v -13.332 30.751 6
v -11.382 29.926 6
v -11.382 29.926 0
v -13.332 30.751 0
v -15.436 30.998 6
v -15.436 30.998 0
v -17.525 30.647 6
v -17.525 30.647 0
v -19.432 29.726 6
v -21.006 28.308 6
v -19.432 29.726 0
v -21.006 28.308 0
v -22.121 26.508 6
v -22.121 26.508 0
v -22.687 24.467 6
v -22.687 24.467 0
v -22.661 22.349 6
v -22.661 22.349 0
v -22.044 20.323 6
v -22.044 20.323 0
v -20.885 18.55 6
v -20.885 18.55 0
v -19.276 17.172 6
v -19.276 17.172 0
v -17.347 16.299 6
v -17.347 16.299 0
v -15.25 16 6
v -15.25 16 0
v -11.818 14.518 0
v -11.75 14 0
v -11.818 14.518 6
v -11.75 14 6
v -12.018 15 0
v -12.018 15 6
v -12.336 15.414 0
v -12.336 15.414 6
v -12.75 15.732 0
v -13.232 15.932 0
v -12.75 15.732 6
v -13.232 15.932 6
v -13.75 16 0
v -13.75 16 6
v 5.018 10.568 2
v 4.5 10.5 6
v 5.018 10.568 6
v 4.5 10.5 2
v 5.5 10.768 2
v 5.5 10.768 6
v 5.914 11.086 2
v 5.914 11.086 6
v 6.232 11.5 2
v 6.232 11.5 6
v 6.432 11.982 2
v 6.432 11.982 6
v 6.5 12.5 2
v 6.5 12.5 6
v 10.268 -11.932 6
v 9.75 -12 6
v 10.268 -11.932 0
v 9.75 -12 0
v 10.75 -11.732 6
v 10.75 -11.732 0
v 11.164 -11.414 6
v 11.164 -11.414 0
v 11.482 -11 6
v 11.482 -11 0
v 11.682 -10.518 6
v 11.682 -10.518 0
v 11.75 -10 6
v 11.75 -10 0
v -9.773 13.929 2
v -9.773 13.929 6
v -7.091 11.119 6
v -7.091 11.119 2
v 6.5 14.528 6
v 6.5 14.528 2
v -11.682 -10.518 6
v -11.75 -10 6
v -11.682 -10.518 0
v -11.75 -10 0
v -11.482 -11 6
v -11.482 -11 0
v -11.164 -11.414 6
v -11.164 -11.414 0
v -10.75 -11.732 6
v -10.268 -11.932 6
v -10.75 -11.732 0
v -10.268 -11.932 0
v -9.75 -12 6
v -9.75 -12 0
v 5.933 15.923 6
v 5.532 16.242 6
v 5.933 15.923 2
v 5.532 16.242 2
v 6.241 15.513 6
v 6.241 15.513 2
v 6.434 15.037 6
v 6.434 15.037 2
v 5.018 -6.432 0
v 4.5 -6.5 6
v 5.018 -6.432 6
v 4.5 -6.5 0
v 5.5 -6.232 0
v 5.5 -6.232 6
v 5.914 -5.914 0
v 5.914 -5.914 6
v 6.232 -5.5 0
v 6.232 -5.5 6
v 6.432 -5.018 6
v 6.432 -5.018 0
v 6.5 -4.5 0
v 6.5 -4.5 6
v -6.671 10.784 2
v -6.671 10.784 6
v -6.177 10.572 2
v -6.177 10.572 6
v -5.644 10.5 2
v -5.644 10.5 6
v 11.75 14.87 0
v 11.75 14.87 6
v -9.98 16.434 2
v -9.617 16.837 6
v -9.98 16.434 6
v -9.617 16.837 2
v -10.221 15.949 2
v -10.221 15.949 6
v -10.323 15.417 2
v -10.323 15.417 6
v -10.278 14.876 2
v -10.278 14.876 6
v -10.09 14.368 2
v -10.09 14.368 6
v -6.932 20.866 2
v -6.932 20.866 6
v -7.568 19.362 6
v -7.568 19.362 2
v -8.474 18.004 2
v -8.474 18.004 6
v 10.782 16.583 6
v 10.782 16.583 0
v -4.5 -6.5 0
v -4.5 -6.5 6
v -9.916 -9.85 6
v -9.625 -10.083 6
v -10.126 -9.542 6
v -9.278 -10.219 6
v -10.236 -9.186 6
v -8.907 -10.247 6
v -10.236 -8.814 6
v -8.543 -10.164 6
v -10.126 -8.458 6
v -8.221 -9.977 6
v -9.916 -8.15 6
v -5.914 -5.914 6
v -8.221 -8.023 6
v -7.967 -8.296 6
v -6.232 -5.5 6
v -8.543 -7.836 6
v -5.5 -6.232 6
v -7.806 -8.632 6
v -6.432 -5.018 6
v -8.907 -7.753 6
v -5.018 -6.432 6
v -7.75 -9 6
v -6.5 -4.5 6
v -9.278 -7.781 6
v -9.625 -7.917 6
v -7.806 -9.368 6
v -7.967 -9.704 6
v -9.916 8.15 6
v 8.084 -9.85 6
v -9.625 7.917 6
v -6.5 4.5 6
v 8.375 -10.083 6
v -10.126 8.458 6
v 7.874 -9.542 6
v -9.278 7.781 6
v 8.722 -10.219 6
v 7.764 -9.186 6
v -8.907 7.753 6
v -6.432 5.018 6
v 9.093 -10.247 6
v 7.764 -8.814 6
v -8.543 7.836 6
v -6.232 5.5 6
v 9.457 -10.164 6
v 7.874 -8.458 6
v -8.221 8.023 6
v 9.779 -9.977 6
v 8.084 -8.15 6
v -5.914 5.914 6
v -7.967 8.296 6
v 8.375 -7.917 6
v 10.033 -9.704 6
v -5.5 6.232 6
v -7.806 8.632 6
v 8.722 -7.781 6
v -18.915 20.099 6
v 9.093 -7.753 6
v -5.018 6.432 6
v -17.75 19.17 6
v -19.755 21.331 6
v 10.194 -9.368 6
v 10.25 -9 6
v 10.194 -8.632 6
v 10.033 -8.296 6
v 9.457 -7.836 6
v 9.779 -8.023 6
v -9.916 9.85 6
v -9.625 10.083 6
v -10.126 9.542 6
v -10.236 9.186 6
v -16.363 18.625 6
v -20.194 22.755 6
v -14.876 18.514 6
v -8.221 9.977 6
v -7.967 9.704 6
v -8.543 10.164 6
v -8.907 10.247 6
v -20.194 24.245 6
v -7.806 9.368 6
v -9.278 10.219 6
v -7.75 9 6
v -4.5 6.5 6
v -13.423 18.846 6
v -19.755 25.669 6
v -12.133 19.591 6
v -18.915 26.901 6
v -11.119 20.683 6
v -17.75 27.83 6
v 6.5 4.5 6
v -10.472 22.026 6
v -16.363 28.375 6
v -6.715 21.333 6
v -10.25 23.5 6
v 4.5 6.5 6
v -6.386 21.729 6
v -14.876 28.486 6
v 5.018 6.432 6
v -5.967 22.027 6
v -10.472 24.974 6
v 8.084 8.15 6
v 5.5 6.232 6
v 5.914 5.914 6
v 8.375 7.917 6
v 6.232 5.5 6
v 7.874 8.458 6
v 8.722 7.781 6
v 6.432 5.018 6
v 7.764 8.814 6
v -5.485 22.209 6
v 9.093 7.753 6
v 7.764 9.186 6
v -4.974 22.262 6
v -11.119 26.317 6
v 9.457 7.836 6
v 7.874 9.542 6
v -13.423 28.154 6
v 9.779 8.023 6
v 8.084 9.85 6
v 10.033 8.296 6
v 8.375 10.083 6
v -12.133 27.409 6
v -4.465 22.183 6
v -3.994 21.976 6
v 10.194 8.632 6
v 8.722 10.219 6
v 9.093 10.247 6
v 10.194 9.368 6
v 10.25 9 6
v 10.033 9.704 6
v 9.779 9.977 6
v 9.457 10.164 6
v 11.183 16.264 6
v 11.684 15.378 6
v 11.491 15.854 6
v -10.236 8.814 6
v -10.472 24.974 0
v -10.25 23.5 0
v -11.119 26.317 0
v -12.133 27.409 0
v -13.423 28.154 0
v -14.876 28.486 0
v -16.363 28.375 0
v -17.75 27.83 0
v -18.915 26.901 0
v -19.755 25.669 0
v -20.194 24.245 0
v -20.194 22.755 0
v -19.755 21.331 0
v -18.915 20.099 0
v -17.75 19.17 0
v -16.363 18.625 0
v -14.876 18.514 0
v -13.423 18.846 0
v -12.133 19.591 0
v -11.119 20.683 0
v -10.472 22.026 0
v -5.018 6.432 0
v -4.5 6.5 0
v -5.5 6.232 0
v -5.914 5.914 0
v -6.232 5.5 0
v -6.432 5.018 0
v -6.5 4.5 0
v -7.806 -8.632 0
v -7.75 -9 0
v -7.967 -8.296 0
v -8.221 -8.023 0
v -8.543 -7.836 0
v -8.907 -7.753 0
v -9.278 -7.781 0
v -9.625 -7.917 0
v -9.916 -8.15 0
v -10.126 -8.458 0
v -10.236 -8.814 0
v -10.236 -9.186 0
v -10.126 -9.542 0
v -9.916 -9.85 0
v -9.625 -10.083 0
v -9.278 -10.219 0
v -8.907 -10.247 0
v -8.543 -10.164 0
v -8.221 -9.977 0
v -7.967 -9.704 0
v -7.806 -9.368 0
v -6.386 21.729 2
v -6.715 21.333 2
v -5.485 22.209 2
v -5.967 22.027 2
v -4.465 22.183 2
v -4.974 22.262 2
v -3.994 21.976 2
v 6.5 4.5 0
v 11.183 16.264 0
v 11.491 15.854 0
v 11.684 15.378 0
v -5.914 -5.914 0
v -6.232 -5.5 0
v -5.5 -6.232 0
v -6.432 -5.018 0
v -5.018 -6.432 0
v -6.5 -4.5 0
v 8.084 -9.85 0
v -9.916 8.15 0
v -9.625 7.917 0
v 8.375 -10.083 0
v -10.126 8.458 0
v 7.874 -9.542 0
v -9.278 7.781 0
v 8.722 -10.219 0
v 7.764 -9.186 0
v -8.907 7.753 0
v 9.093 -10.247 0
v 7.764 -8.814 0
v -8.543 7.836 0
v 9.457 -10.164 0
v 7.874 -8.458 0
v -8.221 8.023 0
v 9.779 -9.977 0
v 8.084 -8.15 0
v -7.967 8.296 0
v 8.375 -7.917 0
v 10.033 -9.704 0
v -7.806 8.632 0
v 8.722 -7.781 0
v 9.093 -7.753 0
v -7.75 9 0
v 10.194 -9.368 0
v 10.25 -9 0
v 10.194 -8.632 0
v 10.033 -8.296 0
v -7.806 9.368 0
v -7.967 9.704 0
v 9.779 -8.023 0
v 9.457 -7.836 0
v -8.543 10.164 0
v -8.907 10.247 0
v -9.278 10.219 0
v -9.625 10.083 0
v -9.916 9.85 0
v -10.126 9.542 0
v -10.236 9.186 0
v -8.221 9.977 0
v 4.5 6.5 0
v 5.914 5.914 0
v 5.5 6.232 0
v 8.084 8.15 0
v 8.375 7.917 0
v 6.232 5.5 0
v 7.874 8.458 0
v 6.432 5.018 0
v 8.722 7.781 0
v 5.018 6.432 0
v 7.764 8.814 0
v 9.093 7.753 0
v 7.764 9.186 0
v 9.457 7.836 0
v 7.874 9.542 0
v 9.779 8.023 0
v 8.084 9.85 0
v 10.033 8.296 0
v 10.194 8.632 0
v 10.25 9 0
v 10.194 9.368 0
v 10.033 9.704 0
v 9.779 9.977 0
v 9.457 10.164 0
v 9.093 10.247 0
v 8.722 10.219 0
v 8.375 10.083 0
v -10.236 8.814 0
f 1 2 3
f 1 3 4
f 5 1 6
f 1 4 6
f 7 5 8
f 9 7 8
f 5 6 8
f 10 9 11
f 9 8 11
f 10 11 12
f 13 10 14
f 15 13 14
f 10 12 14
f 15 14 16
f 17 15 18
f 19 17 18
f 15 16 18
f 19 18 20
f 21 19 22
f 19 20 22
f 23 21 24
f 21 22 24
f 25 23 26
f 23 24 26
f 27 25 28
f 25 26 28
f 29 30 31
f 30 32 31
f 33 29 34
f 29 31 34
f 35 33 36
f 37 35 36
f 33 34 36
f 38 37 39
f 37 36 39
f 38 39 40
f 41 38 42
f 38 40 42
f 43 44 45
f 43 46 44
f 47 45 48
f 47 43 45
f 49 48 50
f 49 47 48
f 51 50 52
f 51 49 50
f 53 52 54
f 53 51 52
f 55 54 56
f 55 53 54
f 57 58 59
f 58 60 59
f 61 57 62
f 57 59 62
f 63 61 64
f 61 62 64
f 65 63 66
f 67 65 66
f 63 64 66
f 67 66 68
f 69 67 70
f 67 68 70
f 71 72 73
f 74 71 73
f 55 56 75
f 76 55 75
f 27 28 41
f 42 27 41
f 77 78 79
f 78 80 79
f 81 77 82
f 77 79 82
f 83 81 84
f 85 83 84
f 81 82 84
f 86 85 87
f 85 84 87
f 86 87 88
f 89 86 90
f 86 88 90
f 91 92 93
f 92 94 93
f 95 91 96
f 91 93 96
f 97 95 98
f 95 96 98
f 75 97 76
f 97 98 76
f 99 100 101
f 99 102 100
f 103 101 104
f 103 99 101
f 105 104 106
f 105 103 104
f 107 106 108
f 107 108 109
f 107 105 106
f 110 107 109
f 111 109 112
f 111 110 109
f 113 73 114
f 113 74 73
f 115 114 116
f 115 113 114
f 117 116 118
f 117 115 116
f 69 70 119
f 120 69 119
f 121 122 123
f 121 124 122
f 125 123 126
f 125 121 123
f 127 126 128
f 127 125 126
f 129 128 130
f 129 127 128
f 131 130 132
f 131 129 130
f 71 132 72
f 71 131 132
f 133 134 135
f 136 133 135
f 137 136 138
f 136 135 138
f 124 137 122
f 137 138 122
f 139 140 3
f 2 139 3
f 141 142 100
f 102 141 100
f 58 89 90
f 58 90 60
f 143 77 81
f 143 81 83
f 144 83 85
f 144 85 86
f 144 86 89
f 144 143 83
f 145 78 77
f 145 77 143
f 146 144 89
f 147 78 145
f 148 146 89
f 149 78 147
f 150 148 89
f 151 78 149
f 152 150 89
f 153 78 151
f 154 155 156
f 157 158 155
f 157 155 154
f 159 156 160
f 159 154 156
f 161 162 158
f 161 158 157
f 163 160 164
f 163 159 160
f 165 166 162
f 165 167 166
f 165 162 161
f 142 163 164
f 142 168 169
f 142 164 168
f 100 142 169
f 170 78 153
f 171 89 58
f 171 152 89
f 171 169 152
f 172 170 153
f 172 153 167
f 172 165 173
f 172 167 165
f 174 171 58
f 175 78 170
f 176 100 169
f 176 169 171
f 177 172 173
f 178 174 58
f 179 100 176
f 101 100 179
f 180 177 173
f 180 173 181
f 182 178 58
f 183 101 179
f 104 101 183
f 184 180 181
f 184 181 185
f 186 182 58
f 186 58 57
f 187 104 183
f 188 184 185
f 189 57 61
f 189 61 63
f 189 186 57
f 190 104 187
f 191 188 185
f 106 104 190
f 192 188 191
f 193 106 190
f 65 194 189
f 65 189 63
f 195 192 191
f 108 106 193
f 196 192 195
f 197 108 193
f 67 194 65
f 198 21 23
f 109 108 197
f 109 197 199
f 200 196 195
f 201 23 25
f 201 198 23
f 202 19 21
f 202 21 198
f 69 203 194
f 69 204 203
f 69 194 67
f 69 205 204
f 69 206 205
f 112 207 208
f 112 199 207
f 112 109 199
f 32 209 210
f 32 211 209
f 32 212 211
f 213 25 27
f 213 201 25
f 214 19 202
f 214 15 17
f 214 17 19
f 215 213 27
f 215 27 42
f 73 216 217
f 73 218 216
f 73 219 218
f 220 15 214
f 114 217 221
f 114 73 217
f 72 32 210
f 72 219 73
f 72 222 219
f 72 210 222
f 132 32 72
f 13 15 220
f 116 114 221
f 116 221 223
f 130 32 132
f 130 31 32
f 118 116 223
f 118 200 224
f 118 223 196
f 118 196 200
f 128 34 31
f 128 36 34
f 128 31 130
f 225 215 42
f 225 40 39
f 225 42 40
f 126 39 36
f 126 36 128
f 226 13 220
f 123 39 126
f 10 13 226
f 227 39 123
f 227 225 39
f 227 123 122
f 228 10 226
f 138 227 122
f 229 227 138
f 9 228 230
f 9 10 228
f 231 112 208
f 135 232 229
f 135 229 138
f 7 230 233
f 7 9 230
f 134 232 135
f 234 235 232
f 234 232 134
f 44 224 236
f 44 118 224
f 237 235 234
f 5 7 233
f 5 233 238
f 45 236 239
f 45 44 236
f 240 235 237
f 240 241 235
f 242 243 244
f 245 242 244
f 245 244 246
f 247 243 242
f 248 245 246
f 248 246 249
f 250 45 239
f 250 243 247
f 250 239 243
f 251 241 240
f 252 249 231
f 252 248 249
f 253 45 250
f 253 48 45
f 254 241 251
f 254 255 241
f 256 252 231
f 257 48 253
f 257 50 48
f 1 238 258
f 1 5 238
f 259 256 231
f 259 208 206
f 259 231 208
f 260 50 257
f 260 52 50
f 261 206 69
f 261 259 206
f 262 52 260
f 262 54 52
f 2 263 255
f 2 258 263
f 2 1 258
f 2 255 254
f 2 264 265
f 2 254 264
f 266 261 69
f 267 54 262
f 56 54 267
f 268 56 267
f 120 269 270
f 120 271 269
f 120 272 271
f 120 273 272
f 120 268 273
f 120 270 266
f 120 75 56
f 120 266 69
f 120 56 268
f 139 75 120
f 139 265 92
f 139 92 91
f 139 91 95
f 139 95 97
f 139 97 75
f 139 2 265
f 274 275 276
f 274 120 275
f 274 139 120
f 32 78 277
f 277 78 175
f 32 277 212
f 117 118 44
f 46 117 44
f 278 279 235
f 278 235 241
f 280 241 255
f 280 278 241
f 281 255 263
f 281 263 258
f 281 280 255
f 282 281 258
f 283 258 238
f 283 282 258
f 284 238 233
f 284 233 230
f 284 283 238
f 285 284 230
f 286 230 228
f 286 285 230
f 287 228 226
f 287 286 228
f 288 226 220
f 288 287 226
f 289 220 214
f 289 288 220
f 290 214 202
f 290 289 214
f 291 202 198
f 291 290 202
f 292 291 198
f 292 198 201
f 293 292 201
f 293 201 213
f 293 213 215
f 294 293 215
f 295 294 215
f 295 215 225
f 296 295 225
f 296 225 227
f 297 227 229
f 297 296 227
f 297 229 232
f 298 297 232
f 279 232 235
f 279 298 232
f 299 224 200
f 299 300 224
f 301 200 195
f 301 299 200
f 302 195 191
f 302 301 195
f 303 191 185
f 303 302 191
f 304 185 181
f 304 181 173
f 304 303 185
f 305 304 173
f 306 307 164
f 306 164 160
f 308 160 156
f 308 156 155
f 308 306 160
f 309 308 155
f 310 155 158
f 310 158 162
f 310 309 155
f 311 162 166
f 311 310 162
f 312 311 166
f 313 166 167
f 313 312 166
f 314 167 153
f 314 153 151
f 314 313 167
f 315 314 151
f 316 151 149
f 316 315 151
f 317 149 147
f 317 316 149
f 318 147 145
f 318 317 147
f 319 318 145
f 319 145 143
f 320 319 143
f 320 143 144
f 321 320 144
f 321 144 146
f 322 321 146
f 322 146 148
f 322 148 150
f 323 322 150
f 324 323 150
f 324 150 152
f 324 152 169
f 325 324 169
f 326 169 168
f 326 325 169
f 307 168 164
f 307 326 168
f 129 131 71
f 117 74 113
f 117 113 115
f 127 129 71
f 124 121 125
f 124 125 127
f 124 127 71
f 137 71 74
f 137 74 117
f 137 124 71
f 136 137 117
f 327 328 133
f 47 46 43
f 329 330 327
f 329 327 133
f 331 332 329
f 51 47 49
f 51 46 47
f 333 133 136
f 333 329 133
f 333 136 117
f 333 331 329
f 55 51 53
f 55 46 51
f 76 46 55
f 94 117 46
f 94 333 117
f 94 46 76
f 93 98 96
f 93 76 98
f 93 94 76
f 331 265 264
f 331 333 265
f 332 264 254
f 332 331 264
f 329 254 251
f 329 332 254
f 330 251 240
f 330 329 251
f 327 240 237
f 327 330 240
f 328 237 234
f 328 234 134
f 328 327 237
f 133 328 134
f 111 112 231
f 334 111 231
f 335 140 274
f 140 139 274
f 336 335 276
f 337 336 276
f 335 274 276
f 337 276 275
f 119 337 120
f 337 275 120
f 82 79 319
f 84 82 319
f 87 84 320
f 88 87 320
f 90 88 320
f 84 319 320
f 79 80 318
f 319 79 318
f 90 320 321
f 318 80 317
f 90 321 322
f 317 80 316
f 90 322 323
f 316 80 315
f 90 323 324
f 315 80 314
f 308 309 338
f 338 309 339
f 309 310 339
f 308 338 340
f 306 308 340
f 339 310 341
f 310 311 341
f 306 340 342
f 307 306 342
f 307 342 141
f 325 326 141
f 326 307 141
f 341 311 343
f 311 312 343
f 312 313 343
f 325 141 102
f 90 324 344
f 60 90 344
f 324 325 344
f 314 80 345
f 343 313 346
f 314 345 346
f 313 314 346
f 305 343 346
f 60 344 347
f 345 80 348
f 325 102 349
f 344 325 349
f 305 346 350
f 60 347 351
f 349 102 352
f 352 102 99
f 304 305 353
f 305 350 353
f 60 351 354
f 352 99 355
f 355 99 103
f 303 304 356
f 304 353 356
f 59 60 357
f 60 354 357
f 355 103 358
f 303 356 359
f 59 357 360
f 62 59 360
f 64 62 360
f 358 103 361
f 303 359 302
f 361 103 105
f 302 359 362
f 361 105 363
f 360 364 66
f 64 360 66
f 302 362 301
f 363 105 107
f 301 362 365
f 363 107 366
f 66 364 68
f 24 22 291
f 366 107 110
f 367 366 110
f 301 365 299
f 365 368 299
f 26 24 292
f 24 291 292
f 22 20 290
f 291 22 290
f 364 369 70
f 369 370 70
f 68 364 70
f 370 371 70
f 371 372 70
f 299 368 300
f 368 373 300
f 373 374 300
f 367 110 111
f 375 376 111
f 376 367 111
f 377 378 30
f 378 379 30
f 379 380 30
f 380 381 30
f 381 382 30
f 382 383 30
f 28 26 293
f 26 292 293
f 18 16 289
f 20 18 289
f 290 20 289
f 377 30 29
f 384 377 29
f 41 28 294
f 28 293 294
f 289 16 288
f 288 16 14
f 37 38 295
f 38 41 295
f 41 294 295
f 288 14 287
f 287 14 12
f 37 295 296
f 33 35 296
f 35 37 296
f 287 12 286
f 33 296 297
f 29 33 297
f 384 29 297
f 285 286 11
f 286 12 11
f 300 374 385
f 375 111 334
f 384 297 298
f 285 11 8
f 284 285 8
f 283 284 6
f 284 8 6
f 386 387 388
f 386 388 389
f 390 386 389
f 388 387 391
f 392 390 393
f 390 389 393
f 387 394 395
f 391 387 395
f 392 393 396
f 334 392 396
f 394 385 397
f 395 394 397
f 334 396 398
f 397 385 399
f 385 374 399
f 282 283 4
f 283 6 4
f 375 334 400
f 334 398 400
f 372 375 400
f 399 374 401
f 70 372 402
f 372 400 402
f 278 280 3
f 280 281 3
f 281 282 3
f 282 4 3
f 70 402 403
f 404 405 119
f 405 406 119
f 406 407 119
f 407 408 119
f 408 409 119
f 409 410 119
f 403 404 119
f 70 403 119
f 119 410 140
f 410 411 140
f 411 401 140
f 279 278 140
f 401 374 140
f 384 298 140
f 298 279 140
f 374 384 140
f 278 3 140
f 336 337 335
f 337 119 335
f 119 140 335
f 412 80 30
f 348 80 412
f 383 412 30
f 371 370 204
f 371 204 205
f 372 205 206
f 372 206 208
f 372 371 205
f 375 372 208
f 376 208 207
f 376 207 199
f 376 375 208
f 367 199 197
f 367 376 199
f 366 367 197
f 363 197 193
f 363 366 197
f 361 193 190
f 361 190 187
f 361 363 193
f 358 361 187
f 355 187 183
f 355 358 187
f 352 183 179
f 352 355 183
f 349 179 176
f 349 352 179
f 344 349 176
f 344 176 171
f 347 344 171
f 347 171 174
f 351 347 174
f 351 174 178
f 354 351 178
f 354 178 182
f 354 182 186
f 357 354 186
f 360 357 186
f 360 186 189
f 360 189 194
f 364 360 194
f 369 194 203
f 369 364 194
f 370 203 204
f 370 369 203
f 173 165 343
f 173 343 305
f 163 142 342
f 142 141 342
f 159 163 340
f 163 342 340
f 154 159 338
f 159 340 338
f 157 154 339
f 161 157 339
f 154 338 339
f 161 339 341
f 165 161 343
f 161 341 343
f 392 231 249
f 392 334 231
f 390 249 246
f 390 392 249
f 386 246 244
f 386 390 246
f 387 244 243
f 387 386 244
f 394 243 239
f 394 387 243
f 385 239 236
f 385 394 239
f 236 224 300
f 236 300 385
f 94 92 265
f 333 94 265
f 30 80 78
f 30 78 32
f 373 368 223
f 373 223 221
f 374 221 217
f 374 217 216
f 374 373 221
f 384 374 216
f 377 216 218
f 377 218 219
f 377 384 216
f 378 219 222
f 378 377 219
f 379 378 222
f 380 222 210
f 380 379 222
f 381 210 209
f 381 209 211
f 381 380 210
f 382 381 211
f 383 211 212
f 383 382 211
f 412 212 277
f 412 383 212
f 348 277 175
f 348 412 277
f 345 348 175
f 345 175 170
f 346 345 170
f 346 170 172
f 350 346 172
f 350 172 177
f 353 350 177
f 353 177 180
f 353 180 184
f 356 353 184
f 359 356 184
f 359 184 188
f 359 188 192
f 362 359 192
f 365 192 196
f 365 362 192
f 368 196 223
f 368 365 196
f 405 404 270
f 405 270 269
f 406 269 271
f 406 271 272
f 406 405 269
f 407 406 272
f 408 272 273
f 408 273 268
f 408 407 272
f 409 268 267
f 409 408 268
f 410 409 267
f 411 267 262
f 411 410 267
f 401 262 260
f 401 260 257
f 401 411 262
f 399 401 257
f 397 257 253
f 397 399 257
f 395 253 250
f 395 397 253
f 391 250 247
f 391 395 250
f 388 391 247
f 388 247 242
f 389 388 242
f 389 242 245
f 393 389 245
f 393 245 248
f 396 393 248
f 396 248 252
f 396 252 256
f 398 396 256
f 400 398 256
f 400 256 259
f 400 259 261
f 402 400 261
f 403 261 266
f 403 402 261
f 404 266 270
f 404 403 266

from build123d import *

# Parameters (mm, degrees)
SKETCH_1_R          = 7.5
SKETCH_1_R_2        = 5
SKETCH_1_W          = 23.5
SKETCH_1_H          = 32
SKETCH_1_R_3        = 1.25
EXTRUDE_1_DEPTH     = 6
SKETCH_3_W          = 23.5
SKETCH_3_H          = 4
SKETCH_3_W_2        = 13
SKETCH_3_H_2        = 13
CUT_EXTRUDE_1_DEPTH = 7
CUT_EXTRUDE_2_DEPTH = 4
FILLET_2_R          = 2


with BuildPart() as part:
    # 草图1 → 凸台-拉伸1 (new body)
    # profile 1 of 3: a face of its own
    with BuildSketch(Plane.XY):
        with BuildLine():
            Line((-15.25, 16), (-11.75, 16))
            Line((-11.75, 16), (11.75, 16))
            Line((11.75, 16), (-11.381805158, 29.925501433))
            ThreePointArc((-11.381805158, 29.925501433), (-8.72077871, 27.190429425), (-7.75, 23.5))
            ThreePointArc((-7.75, 23.5), (-9.946699141, 18.196699141), (-15.25, 16))
        make_face()
    # profile 2 of 3: a face of its own
    with BuildSketch(Plane.XY):
        with Locations((-15.25, 23.5)):
            Circle(SKETCH_1_R)
        with Locations((-15.25, 23.5)):
            Circle(SKETCH_1_R_2, mode=Mode.SUBTRACT)
    # profile 3 of 3: a face of its own
    with BuildSketch(Plane.XY):
        Rectangle(SKETCH_1_W, SKETCH_1_H)
        with Locations((9, -9)):
            Circle(SKETCH_1_R_3, mode=Mode.SUBTRACT)
        with Locations((-9, -9)):
            Circle(SKETCH_1_R_3, mode=Mode.SUBTRACT)
        with Locations((-9, 9)):
            Circle(SKETCH_1_R_3, mode=Mode.SUBTRACT)
        with Locations((9, 9)):
            Circle(SKETCH_1_R_3, mode=Mode.SUBTRACT)
    extrude(amount=EXTRUDE_1_DEPTH)

    # 草图3 → 切除-拉伸1 (cut)
    with BuildSketch(Plane.XY.offset(6)):
        with Locations((0, -14)):
            Rectangle(SKETCH_3_W, SKETCH_3_H)
        Rectangle(SKETCH_3_W_2, SKETCH_3_H_2)
    extrude(amount=-CUT_EXTRUDE_1_DEPTH, mode=Mode.SUBTRACT)

    # 草图4 → 切除-拉伸2 (cut)
    with BuildSketch(Plane.XY.offset(6)):
        with BuildLine():
            Line((6.5, 15.658862876), (-6.525, 23.5))
            ThreePointArc((-6.525, 23.5), (-7.850272246, 18.877267672), (-11.423488063, 15.658862876))
            Line((-11.423488063, 15.658862876), (6.5, 15.658862876))
        make_face()
        Polygon((-6.5, 10.5), (6.5, 10.5), (6.5, 15.658862876), (-11.423488063, 15.658862876), align=None)
    extrude(amount=-CUT_EXTRUDE_2_DEPTH, mode=Mode.SUBTRACT)

    # 圆角2
    fillet_2_edges = [part.edges().sort_by_distance(p)[0] for p in [
        (11.75, 16, 3),
        (-11.75, 16, 3),
        (-11.75, -12, 3),
        (11.75, -12, 3),
        (6.5, 6.5, 3),
        (6.5, -6.5, 3),
        (-6.5, -6.5, 3),
        (-6.5, 6.5, 3),
        (-11.423488063, 15.658862876, 4),
        (-6.525, 23.5, 4),
        (6.5, 15.658862876, 4),
        (6.5, 10.5, 4),
        (-6.5, 10.5, 4),
    ]]
    fillet(fillet_2_edges, radius=FILLET_2_R)


solid = part.part
